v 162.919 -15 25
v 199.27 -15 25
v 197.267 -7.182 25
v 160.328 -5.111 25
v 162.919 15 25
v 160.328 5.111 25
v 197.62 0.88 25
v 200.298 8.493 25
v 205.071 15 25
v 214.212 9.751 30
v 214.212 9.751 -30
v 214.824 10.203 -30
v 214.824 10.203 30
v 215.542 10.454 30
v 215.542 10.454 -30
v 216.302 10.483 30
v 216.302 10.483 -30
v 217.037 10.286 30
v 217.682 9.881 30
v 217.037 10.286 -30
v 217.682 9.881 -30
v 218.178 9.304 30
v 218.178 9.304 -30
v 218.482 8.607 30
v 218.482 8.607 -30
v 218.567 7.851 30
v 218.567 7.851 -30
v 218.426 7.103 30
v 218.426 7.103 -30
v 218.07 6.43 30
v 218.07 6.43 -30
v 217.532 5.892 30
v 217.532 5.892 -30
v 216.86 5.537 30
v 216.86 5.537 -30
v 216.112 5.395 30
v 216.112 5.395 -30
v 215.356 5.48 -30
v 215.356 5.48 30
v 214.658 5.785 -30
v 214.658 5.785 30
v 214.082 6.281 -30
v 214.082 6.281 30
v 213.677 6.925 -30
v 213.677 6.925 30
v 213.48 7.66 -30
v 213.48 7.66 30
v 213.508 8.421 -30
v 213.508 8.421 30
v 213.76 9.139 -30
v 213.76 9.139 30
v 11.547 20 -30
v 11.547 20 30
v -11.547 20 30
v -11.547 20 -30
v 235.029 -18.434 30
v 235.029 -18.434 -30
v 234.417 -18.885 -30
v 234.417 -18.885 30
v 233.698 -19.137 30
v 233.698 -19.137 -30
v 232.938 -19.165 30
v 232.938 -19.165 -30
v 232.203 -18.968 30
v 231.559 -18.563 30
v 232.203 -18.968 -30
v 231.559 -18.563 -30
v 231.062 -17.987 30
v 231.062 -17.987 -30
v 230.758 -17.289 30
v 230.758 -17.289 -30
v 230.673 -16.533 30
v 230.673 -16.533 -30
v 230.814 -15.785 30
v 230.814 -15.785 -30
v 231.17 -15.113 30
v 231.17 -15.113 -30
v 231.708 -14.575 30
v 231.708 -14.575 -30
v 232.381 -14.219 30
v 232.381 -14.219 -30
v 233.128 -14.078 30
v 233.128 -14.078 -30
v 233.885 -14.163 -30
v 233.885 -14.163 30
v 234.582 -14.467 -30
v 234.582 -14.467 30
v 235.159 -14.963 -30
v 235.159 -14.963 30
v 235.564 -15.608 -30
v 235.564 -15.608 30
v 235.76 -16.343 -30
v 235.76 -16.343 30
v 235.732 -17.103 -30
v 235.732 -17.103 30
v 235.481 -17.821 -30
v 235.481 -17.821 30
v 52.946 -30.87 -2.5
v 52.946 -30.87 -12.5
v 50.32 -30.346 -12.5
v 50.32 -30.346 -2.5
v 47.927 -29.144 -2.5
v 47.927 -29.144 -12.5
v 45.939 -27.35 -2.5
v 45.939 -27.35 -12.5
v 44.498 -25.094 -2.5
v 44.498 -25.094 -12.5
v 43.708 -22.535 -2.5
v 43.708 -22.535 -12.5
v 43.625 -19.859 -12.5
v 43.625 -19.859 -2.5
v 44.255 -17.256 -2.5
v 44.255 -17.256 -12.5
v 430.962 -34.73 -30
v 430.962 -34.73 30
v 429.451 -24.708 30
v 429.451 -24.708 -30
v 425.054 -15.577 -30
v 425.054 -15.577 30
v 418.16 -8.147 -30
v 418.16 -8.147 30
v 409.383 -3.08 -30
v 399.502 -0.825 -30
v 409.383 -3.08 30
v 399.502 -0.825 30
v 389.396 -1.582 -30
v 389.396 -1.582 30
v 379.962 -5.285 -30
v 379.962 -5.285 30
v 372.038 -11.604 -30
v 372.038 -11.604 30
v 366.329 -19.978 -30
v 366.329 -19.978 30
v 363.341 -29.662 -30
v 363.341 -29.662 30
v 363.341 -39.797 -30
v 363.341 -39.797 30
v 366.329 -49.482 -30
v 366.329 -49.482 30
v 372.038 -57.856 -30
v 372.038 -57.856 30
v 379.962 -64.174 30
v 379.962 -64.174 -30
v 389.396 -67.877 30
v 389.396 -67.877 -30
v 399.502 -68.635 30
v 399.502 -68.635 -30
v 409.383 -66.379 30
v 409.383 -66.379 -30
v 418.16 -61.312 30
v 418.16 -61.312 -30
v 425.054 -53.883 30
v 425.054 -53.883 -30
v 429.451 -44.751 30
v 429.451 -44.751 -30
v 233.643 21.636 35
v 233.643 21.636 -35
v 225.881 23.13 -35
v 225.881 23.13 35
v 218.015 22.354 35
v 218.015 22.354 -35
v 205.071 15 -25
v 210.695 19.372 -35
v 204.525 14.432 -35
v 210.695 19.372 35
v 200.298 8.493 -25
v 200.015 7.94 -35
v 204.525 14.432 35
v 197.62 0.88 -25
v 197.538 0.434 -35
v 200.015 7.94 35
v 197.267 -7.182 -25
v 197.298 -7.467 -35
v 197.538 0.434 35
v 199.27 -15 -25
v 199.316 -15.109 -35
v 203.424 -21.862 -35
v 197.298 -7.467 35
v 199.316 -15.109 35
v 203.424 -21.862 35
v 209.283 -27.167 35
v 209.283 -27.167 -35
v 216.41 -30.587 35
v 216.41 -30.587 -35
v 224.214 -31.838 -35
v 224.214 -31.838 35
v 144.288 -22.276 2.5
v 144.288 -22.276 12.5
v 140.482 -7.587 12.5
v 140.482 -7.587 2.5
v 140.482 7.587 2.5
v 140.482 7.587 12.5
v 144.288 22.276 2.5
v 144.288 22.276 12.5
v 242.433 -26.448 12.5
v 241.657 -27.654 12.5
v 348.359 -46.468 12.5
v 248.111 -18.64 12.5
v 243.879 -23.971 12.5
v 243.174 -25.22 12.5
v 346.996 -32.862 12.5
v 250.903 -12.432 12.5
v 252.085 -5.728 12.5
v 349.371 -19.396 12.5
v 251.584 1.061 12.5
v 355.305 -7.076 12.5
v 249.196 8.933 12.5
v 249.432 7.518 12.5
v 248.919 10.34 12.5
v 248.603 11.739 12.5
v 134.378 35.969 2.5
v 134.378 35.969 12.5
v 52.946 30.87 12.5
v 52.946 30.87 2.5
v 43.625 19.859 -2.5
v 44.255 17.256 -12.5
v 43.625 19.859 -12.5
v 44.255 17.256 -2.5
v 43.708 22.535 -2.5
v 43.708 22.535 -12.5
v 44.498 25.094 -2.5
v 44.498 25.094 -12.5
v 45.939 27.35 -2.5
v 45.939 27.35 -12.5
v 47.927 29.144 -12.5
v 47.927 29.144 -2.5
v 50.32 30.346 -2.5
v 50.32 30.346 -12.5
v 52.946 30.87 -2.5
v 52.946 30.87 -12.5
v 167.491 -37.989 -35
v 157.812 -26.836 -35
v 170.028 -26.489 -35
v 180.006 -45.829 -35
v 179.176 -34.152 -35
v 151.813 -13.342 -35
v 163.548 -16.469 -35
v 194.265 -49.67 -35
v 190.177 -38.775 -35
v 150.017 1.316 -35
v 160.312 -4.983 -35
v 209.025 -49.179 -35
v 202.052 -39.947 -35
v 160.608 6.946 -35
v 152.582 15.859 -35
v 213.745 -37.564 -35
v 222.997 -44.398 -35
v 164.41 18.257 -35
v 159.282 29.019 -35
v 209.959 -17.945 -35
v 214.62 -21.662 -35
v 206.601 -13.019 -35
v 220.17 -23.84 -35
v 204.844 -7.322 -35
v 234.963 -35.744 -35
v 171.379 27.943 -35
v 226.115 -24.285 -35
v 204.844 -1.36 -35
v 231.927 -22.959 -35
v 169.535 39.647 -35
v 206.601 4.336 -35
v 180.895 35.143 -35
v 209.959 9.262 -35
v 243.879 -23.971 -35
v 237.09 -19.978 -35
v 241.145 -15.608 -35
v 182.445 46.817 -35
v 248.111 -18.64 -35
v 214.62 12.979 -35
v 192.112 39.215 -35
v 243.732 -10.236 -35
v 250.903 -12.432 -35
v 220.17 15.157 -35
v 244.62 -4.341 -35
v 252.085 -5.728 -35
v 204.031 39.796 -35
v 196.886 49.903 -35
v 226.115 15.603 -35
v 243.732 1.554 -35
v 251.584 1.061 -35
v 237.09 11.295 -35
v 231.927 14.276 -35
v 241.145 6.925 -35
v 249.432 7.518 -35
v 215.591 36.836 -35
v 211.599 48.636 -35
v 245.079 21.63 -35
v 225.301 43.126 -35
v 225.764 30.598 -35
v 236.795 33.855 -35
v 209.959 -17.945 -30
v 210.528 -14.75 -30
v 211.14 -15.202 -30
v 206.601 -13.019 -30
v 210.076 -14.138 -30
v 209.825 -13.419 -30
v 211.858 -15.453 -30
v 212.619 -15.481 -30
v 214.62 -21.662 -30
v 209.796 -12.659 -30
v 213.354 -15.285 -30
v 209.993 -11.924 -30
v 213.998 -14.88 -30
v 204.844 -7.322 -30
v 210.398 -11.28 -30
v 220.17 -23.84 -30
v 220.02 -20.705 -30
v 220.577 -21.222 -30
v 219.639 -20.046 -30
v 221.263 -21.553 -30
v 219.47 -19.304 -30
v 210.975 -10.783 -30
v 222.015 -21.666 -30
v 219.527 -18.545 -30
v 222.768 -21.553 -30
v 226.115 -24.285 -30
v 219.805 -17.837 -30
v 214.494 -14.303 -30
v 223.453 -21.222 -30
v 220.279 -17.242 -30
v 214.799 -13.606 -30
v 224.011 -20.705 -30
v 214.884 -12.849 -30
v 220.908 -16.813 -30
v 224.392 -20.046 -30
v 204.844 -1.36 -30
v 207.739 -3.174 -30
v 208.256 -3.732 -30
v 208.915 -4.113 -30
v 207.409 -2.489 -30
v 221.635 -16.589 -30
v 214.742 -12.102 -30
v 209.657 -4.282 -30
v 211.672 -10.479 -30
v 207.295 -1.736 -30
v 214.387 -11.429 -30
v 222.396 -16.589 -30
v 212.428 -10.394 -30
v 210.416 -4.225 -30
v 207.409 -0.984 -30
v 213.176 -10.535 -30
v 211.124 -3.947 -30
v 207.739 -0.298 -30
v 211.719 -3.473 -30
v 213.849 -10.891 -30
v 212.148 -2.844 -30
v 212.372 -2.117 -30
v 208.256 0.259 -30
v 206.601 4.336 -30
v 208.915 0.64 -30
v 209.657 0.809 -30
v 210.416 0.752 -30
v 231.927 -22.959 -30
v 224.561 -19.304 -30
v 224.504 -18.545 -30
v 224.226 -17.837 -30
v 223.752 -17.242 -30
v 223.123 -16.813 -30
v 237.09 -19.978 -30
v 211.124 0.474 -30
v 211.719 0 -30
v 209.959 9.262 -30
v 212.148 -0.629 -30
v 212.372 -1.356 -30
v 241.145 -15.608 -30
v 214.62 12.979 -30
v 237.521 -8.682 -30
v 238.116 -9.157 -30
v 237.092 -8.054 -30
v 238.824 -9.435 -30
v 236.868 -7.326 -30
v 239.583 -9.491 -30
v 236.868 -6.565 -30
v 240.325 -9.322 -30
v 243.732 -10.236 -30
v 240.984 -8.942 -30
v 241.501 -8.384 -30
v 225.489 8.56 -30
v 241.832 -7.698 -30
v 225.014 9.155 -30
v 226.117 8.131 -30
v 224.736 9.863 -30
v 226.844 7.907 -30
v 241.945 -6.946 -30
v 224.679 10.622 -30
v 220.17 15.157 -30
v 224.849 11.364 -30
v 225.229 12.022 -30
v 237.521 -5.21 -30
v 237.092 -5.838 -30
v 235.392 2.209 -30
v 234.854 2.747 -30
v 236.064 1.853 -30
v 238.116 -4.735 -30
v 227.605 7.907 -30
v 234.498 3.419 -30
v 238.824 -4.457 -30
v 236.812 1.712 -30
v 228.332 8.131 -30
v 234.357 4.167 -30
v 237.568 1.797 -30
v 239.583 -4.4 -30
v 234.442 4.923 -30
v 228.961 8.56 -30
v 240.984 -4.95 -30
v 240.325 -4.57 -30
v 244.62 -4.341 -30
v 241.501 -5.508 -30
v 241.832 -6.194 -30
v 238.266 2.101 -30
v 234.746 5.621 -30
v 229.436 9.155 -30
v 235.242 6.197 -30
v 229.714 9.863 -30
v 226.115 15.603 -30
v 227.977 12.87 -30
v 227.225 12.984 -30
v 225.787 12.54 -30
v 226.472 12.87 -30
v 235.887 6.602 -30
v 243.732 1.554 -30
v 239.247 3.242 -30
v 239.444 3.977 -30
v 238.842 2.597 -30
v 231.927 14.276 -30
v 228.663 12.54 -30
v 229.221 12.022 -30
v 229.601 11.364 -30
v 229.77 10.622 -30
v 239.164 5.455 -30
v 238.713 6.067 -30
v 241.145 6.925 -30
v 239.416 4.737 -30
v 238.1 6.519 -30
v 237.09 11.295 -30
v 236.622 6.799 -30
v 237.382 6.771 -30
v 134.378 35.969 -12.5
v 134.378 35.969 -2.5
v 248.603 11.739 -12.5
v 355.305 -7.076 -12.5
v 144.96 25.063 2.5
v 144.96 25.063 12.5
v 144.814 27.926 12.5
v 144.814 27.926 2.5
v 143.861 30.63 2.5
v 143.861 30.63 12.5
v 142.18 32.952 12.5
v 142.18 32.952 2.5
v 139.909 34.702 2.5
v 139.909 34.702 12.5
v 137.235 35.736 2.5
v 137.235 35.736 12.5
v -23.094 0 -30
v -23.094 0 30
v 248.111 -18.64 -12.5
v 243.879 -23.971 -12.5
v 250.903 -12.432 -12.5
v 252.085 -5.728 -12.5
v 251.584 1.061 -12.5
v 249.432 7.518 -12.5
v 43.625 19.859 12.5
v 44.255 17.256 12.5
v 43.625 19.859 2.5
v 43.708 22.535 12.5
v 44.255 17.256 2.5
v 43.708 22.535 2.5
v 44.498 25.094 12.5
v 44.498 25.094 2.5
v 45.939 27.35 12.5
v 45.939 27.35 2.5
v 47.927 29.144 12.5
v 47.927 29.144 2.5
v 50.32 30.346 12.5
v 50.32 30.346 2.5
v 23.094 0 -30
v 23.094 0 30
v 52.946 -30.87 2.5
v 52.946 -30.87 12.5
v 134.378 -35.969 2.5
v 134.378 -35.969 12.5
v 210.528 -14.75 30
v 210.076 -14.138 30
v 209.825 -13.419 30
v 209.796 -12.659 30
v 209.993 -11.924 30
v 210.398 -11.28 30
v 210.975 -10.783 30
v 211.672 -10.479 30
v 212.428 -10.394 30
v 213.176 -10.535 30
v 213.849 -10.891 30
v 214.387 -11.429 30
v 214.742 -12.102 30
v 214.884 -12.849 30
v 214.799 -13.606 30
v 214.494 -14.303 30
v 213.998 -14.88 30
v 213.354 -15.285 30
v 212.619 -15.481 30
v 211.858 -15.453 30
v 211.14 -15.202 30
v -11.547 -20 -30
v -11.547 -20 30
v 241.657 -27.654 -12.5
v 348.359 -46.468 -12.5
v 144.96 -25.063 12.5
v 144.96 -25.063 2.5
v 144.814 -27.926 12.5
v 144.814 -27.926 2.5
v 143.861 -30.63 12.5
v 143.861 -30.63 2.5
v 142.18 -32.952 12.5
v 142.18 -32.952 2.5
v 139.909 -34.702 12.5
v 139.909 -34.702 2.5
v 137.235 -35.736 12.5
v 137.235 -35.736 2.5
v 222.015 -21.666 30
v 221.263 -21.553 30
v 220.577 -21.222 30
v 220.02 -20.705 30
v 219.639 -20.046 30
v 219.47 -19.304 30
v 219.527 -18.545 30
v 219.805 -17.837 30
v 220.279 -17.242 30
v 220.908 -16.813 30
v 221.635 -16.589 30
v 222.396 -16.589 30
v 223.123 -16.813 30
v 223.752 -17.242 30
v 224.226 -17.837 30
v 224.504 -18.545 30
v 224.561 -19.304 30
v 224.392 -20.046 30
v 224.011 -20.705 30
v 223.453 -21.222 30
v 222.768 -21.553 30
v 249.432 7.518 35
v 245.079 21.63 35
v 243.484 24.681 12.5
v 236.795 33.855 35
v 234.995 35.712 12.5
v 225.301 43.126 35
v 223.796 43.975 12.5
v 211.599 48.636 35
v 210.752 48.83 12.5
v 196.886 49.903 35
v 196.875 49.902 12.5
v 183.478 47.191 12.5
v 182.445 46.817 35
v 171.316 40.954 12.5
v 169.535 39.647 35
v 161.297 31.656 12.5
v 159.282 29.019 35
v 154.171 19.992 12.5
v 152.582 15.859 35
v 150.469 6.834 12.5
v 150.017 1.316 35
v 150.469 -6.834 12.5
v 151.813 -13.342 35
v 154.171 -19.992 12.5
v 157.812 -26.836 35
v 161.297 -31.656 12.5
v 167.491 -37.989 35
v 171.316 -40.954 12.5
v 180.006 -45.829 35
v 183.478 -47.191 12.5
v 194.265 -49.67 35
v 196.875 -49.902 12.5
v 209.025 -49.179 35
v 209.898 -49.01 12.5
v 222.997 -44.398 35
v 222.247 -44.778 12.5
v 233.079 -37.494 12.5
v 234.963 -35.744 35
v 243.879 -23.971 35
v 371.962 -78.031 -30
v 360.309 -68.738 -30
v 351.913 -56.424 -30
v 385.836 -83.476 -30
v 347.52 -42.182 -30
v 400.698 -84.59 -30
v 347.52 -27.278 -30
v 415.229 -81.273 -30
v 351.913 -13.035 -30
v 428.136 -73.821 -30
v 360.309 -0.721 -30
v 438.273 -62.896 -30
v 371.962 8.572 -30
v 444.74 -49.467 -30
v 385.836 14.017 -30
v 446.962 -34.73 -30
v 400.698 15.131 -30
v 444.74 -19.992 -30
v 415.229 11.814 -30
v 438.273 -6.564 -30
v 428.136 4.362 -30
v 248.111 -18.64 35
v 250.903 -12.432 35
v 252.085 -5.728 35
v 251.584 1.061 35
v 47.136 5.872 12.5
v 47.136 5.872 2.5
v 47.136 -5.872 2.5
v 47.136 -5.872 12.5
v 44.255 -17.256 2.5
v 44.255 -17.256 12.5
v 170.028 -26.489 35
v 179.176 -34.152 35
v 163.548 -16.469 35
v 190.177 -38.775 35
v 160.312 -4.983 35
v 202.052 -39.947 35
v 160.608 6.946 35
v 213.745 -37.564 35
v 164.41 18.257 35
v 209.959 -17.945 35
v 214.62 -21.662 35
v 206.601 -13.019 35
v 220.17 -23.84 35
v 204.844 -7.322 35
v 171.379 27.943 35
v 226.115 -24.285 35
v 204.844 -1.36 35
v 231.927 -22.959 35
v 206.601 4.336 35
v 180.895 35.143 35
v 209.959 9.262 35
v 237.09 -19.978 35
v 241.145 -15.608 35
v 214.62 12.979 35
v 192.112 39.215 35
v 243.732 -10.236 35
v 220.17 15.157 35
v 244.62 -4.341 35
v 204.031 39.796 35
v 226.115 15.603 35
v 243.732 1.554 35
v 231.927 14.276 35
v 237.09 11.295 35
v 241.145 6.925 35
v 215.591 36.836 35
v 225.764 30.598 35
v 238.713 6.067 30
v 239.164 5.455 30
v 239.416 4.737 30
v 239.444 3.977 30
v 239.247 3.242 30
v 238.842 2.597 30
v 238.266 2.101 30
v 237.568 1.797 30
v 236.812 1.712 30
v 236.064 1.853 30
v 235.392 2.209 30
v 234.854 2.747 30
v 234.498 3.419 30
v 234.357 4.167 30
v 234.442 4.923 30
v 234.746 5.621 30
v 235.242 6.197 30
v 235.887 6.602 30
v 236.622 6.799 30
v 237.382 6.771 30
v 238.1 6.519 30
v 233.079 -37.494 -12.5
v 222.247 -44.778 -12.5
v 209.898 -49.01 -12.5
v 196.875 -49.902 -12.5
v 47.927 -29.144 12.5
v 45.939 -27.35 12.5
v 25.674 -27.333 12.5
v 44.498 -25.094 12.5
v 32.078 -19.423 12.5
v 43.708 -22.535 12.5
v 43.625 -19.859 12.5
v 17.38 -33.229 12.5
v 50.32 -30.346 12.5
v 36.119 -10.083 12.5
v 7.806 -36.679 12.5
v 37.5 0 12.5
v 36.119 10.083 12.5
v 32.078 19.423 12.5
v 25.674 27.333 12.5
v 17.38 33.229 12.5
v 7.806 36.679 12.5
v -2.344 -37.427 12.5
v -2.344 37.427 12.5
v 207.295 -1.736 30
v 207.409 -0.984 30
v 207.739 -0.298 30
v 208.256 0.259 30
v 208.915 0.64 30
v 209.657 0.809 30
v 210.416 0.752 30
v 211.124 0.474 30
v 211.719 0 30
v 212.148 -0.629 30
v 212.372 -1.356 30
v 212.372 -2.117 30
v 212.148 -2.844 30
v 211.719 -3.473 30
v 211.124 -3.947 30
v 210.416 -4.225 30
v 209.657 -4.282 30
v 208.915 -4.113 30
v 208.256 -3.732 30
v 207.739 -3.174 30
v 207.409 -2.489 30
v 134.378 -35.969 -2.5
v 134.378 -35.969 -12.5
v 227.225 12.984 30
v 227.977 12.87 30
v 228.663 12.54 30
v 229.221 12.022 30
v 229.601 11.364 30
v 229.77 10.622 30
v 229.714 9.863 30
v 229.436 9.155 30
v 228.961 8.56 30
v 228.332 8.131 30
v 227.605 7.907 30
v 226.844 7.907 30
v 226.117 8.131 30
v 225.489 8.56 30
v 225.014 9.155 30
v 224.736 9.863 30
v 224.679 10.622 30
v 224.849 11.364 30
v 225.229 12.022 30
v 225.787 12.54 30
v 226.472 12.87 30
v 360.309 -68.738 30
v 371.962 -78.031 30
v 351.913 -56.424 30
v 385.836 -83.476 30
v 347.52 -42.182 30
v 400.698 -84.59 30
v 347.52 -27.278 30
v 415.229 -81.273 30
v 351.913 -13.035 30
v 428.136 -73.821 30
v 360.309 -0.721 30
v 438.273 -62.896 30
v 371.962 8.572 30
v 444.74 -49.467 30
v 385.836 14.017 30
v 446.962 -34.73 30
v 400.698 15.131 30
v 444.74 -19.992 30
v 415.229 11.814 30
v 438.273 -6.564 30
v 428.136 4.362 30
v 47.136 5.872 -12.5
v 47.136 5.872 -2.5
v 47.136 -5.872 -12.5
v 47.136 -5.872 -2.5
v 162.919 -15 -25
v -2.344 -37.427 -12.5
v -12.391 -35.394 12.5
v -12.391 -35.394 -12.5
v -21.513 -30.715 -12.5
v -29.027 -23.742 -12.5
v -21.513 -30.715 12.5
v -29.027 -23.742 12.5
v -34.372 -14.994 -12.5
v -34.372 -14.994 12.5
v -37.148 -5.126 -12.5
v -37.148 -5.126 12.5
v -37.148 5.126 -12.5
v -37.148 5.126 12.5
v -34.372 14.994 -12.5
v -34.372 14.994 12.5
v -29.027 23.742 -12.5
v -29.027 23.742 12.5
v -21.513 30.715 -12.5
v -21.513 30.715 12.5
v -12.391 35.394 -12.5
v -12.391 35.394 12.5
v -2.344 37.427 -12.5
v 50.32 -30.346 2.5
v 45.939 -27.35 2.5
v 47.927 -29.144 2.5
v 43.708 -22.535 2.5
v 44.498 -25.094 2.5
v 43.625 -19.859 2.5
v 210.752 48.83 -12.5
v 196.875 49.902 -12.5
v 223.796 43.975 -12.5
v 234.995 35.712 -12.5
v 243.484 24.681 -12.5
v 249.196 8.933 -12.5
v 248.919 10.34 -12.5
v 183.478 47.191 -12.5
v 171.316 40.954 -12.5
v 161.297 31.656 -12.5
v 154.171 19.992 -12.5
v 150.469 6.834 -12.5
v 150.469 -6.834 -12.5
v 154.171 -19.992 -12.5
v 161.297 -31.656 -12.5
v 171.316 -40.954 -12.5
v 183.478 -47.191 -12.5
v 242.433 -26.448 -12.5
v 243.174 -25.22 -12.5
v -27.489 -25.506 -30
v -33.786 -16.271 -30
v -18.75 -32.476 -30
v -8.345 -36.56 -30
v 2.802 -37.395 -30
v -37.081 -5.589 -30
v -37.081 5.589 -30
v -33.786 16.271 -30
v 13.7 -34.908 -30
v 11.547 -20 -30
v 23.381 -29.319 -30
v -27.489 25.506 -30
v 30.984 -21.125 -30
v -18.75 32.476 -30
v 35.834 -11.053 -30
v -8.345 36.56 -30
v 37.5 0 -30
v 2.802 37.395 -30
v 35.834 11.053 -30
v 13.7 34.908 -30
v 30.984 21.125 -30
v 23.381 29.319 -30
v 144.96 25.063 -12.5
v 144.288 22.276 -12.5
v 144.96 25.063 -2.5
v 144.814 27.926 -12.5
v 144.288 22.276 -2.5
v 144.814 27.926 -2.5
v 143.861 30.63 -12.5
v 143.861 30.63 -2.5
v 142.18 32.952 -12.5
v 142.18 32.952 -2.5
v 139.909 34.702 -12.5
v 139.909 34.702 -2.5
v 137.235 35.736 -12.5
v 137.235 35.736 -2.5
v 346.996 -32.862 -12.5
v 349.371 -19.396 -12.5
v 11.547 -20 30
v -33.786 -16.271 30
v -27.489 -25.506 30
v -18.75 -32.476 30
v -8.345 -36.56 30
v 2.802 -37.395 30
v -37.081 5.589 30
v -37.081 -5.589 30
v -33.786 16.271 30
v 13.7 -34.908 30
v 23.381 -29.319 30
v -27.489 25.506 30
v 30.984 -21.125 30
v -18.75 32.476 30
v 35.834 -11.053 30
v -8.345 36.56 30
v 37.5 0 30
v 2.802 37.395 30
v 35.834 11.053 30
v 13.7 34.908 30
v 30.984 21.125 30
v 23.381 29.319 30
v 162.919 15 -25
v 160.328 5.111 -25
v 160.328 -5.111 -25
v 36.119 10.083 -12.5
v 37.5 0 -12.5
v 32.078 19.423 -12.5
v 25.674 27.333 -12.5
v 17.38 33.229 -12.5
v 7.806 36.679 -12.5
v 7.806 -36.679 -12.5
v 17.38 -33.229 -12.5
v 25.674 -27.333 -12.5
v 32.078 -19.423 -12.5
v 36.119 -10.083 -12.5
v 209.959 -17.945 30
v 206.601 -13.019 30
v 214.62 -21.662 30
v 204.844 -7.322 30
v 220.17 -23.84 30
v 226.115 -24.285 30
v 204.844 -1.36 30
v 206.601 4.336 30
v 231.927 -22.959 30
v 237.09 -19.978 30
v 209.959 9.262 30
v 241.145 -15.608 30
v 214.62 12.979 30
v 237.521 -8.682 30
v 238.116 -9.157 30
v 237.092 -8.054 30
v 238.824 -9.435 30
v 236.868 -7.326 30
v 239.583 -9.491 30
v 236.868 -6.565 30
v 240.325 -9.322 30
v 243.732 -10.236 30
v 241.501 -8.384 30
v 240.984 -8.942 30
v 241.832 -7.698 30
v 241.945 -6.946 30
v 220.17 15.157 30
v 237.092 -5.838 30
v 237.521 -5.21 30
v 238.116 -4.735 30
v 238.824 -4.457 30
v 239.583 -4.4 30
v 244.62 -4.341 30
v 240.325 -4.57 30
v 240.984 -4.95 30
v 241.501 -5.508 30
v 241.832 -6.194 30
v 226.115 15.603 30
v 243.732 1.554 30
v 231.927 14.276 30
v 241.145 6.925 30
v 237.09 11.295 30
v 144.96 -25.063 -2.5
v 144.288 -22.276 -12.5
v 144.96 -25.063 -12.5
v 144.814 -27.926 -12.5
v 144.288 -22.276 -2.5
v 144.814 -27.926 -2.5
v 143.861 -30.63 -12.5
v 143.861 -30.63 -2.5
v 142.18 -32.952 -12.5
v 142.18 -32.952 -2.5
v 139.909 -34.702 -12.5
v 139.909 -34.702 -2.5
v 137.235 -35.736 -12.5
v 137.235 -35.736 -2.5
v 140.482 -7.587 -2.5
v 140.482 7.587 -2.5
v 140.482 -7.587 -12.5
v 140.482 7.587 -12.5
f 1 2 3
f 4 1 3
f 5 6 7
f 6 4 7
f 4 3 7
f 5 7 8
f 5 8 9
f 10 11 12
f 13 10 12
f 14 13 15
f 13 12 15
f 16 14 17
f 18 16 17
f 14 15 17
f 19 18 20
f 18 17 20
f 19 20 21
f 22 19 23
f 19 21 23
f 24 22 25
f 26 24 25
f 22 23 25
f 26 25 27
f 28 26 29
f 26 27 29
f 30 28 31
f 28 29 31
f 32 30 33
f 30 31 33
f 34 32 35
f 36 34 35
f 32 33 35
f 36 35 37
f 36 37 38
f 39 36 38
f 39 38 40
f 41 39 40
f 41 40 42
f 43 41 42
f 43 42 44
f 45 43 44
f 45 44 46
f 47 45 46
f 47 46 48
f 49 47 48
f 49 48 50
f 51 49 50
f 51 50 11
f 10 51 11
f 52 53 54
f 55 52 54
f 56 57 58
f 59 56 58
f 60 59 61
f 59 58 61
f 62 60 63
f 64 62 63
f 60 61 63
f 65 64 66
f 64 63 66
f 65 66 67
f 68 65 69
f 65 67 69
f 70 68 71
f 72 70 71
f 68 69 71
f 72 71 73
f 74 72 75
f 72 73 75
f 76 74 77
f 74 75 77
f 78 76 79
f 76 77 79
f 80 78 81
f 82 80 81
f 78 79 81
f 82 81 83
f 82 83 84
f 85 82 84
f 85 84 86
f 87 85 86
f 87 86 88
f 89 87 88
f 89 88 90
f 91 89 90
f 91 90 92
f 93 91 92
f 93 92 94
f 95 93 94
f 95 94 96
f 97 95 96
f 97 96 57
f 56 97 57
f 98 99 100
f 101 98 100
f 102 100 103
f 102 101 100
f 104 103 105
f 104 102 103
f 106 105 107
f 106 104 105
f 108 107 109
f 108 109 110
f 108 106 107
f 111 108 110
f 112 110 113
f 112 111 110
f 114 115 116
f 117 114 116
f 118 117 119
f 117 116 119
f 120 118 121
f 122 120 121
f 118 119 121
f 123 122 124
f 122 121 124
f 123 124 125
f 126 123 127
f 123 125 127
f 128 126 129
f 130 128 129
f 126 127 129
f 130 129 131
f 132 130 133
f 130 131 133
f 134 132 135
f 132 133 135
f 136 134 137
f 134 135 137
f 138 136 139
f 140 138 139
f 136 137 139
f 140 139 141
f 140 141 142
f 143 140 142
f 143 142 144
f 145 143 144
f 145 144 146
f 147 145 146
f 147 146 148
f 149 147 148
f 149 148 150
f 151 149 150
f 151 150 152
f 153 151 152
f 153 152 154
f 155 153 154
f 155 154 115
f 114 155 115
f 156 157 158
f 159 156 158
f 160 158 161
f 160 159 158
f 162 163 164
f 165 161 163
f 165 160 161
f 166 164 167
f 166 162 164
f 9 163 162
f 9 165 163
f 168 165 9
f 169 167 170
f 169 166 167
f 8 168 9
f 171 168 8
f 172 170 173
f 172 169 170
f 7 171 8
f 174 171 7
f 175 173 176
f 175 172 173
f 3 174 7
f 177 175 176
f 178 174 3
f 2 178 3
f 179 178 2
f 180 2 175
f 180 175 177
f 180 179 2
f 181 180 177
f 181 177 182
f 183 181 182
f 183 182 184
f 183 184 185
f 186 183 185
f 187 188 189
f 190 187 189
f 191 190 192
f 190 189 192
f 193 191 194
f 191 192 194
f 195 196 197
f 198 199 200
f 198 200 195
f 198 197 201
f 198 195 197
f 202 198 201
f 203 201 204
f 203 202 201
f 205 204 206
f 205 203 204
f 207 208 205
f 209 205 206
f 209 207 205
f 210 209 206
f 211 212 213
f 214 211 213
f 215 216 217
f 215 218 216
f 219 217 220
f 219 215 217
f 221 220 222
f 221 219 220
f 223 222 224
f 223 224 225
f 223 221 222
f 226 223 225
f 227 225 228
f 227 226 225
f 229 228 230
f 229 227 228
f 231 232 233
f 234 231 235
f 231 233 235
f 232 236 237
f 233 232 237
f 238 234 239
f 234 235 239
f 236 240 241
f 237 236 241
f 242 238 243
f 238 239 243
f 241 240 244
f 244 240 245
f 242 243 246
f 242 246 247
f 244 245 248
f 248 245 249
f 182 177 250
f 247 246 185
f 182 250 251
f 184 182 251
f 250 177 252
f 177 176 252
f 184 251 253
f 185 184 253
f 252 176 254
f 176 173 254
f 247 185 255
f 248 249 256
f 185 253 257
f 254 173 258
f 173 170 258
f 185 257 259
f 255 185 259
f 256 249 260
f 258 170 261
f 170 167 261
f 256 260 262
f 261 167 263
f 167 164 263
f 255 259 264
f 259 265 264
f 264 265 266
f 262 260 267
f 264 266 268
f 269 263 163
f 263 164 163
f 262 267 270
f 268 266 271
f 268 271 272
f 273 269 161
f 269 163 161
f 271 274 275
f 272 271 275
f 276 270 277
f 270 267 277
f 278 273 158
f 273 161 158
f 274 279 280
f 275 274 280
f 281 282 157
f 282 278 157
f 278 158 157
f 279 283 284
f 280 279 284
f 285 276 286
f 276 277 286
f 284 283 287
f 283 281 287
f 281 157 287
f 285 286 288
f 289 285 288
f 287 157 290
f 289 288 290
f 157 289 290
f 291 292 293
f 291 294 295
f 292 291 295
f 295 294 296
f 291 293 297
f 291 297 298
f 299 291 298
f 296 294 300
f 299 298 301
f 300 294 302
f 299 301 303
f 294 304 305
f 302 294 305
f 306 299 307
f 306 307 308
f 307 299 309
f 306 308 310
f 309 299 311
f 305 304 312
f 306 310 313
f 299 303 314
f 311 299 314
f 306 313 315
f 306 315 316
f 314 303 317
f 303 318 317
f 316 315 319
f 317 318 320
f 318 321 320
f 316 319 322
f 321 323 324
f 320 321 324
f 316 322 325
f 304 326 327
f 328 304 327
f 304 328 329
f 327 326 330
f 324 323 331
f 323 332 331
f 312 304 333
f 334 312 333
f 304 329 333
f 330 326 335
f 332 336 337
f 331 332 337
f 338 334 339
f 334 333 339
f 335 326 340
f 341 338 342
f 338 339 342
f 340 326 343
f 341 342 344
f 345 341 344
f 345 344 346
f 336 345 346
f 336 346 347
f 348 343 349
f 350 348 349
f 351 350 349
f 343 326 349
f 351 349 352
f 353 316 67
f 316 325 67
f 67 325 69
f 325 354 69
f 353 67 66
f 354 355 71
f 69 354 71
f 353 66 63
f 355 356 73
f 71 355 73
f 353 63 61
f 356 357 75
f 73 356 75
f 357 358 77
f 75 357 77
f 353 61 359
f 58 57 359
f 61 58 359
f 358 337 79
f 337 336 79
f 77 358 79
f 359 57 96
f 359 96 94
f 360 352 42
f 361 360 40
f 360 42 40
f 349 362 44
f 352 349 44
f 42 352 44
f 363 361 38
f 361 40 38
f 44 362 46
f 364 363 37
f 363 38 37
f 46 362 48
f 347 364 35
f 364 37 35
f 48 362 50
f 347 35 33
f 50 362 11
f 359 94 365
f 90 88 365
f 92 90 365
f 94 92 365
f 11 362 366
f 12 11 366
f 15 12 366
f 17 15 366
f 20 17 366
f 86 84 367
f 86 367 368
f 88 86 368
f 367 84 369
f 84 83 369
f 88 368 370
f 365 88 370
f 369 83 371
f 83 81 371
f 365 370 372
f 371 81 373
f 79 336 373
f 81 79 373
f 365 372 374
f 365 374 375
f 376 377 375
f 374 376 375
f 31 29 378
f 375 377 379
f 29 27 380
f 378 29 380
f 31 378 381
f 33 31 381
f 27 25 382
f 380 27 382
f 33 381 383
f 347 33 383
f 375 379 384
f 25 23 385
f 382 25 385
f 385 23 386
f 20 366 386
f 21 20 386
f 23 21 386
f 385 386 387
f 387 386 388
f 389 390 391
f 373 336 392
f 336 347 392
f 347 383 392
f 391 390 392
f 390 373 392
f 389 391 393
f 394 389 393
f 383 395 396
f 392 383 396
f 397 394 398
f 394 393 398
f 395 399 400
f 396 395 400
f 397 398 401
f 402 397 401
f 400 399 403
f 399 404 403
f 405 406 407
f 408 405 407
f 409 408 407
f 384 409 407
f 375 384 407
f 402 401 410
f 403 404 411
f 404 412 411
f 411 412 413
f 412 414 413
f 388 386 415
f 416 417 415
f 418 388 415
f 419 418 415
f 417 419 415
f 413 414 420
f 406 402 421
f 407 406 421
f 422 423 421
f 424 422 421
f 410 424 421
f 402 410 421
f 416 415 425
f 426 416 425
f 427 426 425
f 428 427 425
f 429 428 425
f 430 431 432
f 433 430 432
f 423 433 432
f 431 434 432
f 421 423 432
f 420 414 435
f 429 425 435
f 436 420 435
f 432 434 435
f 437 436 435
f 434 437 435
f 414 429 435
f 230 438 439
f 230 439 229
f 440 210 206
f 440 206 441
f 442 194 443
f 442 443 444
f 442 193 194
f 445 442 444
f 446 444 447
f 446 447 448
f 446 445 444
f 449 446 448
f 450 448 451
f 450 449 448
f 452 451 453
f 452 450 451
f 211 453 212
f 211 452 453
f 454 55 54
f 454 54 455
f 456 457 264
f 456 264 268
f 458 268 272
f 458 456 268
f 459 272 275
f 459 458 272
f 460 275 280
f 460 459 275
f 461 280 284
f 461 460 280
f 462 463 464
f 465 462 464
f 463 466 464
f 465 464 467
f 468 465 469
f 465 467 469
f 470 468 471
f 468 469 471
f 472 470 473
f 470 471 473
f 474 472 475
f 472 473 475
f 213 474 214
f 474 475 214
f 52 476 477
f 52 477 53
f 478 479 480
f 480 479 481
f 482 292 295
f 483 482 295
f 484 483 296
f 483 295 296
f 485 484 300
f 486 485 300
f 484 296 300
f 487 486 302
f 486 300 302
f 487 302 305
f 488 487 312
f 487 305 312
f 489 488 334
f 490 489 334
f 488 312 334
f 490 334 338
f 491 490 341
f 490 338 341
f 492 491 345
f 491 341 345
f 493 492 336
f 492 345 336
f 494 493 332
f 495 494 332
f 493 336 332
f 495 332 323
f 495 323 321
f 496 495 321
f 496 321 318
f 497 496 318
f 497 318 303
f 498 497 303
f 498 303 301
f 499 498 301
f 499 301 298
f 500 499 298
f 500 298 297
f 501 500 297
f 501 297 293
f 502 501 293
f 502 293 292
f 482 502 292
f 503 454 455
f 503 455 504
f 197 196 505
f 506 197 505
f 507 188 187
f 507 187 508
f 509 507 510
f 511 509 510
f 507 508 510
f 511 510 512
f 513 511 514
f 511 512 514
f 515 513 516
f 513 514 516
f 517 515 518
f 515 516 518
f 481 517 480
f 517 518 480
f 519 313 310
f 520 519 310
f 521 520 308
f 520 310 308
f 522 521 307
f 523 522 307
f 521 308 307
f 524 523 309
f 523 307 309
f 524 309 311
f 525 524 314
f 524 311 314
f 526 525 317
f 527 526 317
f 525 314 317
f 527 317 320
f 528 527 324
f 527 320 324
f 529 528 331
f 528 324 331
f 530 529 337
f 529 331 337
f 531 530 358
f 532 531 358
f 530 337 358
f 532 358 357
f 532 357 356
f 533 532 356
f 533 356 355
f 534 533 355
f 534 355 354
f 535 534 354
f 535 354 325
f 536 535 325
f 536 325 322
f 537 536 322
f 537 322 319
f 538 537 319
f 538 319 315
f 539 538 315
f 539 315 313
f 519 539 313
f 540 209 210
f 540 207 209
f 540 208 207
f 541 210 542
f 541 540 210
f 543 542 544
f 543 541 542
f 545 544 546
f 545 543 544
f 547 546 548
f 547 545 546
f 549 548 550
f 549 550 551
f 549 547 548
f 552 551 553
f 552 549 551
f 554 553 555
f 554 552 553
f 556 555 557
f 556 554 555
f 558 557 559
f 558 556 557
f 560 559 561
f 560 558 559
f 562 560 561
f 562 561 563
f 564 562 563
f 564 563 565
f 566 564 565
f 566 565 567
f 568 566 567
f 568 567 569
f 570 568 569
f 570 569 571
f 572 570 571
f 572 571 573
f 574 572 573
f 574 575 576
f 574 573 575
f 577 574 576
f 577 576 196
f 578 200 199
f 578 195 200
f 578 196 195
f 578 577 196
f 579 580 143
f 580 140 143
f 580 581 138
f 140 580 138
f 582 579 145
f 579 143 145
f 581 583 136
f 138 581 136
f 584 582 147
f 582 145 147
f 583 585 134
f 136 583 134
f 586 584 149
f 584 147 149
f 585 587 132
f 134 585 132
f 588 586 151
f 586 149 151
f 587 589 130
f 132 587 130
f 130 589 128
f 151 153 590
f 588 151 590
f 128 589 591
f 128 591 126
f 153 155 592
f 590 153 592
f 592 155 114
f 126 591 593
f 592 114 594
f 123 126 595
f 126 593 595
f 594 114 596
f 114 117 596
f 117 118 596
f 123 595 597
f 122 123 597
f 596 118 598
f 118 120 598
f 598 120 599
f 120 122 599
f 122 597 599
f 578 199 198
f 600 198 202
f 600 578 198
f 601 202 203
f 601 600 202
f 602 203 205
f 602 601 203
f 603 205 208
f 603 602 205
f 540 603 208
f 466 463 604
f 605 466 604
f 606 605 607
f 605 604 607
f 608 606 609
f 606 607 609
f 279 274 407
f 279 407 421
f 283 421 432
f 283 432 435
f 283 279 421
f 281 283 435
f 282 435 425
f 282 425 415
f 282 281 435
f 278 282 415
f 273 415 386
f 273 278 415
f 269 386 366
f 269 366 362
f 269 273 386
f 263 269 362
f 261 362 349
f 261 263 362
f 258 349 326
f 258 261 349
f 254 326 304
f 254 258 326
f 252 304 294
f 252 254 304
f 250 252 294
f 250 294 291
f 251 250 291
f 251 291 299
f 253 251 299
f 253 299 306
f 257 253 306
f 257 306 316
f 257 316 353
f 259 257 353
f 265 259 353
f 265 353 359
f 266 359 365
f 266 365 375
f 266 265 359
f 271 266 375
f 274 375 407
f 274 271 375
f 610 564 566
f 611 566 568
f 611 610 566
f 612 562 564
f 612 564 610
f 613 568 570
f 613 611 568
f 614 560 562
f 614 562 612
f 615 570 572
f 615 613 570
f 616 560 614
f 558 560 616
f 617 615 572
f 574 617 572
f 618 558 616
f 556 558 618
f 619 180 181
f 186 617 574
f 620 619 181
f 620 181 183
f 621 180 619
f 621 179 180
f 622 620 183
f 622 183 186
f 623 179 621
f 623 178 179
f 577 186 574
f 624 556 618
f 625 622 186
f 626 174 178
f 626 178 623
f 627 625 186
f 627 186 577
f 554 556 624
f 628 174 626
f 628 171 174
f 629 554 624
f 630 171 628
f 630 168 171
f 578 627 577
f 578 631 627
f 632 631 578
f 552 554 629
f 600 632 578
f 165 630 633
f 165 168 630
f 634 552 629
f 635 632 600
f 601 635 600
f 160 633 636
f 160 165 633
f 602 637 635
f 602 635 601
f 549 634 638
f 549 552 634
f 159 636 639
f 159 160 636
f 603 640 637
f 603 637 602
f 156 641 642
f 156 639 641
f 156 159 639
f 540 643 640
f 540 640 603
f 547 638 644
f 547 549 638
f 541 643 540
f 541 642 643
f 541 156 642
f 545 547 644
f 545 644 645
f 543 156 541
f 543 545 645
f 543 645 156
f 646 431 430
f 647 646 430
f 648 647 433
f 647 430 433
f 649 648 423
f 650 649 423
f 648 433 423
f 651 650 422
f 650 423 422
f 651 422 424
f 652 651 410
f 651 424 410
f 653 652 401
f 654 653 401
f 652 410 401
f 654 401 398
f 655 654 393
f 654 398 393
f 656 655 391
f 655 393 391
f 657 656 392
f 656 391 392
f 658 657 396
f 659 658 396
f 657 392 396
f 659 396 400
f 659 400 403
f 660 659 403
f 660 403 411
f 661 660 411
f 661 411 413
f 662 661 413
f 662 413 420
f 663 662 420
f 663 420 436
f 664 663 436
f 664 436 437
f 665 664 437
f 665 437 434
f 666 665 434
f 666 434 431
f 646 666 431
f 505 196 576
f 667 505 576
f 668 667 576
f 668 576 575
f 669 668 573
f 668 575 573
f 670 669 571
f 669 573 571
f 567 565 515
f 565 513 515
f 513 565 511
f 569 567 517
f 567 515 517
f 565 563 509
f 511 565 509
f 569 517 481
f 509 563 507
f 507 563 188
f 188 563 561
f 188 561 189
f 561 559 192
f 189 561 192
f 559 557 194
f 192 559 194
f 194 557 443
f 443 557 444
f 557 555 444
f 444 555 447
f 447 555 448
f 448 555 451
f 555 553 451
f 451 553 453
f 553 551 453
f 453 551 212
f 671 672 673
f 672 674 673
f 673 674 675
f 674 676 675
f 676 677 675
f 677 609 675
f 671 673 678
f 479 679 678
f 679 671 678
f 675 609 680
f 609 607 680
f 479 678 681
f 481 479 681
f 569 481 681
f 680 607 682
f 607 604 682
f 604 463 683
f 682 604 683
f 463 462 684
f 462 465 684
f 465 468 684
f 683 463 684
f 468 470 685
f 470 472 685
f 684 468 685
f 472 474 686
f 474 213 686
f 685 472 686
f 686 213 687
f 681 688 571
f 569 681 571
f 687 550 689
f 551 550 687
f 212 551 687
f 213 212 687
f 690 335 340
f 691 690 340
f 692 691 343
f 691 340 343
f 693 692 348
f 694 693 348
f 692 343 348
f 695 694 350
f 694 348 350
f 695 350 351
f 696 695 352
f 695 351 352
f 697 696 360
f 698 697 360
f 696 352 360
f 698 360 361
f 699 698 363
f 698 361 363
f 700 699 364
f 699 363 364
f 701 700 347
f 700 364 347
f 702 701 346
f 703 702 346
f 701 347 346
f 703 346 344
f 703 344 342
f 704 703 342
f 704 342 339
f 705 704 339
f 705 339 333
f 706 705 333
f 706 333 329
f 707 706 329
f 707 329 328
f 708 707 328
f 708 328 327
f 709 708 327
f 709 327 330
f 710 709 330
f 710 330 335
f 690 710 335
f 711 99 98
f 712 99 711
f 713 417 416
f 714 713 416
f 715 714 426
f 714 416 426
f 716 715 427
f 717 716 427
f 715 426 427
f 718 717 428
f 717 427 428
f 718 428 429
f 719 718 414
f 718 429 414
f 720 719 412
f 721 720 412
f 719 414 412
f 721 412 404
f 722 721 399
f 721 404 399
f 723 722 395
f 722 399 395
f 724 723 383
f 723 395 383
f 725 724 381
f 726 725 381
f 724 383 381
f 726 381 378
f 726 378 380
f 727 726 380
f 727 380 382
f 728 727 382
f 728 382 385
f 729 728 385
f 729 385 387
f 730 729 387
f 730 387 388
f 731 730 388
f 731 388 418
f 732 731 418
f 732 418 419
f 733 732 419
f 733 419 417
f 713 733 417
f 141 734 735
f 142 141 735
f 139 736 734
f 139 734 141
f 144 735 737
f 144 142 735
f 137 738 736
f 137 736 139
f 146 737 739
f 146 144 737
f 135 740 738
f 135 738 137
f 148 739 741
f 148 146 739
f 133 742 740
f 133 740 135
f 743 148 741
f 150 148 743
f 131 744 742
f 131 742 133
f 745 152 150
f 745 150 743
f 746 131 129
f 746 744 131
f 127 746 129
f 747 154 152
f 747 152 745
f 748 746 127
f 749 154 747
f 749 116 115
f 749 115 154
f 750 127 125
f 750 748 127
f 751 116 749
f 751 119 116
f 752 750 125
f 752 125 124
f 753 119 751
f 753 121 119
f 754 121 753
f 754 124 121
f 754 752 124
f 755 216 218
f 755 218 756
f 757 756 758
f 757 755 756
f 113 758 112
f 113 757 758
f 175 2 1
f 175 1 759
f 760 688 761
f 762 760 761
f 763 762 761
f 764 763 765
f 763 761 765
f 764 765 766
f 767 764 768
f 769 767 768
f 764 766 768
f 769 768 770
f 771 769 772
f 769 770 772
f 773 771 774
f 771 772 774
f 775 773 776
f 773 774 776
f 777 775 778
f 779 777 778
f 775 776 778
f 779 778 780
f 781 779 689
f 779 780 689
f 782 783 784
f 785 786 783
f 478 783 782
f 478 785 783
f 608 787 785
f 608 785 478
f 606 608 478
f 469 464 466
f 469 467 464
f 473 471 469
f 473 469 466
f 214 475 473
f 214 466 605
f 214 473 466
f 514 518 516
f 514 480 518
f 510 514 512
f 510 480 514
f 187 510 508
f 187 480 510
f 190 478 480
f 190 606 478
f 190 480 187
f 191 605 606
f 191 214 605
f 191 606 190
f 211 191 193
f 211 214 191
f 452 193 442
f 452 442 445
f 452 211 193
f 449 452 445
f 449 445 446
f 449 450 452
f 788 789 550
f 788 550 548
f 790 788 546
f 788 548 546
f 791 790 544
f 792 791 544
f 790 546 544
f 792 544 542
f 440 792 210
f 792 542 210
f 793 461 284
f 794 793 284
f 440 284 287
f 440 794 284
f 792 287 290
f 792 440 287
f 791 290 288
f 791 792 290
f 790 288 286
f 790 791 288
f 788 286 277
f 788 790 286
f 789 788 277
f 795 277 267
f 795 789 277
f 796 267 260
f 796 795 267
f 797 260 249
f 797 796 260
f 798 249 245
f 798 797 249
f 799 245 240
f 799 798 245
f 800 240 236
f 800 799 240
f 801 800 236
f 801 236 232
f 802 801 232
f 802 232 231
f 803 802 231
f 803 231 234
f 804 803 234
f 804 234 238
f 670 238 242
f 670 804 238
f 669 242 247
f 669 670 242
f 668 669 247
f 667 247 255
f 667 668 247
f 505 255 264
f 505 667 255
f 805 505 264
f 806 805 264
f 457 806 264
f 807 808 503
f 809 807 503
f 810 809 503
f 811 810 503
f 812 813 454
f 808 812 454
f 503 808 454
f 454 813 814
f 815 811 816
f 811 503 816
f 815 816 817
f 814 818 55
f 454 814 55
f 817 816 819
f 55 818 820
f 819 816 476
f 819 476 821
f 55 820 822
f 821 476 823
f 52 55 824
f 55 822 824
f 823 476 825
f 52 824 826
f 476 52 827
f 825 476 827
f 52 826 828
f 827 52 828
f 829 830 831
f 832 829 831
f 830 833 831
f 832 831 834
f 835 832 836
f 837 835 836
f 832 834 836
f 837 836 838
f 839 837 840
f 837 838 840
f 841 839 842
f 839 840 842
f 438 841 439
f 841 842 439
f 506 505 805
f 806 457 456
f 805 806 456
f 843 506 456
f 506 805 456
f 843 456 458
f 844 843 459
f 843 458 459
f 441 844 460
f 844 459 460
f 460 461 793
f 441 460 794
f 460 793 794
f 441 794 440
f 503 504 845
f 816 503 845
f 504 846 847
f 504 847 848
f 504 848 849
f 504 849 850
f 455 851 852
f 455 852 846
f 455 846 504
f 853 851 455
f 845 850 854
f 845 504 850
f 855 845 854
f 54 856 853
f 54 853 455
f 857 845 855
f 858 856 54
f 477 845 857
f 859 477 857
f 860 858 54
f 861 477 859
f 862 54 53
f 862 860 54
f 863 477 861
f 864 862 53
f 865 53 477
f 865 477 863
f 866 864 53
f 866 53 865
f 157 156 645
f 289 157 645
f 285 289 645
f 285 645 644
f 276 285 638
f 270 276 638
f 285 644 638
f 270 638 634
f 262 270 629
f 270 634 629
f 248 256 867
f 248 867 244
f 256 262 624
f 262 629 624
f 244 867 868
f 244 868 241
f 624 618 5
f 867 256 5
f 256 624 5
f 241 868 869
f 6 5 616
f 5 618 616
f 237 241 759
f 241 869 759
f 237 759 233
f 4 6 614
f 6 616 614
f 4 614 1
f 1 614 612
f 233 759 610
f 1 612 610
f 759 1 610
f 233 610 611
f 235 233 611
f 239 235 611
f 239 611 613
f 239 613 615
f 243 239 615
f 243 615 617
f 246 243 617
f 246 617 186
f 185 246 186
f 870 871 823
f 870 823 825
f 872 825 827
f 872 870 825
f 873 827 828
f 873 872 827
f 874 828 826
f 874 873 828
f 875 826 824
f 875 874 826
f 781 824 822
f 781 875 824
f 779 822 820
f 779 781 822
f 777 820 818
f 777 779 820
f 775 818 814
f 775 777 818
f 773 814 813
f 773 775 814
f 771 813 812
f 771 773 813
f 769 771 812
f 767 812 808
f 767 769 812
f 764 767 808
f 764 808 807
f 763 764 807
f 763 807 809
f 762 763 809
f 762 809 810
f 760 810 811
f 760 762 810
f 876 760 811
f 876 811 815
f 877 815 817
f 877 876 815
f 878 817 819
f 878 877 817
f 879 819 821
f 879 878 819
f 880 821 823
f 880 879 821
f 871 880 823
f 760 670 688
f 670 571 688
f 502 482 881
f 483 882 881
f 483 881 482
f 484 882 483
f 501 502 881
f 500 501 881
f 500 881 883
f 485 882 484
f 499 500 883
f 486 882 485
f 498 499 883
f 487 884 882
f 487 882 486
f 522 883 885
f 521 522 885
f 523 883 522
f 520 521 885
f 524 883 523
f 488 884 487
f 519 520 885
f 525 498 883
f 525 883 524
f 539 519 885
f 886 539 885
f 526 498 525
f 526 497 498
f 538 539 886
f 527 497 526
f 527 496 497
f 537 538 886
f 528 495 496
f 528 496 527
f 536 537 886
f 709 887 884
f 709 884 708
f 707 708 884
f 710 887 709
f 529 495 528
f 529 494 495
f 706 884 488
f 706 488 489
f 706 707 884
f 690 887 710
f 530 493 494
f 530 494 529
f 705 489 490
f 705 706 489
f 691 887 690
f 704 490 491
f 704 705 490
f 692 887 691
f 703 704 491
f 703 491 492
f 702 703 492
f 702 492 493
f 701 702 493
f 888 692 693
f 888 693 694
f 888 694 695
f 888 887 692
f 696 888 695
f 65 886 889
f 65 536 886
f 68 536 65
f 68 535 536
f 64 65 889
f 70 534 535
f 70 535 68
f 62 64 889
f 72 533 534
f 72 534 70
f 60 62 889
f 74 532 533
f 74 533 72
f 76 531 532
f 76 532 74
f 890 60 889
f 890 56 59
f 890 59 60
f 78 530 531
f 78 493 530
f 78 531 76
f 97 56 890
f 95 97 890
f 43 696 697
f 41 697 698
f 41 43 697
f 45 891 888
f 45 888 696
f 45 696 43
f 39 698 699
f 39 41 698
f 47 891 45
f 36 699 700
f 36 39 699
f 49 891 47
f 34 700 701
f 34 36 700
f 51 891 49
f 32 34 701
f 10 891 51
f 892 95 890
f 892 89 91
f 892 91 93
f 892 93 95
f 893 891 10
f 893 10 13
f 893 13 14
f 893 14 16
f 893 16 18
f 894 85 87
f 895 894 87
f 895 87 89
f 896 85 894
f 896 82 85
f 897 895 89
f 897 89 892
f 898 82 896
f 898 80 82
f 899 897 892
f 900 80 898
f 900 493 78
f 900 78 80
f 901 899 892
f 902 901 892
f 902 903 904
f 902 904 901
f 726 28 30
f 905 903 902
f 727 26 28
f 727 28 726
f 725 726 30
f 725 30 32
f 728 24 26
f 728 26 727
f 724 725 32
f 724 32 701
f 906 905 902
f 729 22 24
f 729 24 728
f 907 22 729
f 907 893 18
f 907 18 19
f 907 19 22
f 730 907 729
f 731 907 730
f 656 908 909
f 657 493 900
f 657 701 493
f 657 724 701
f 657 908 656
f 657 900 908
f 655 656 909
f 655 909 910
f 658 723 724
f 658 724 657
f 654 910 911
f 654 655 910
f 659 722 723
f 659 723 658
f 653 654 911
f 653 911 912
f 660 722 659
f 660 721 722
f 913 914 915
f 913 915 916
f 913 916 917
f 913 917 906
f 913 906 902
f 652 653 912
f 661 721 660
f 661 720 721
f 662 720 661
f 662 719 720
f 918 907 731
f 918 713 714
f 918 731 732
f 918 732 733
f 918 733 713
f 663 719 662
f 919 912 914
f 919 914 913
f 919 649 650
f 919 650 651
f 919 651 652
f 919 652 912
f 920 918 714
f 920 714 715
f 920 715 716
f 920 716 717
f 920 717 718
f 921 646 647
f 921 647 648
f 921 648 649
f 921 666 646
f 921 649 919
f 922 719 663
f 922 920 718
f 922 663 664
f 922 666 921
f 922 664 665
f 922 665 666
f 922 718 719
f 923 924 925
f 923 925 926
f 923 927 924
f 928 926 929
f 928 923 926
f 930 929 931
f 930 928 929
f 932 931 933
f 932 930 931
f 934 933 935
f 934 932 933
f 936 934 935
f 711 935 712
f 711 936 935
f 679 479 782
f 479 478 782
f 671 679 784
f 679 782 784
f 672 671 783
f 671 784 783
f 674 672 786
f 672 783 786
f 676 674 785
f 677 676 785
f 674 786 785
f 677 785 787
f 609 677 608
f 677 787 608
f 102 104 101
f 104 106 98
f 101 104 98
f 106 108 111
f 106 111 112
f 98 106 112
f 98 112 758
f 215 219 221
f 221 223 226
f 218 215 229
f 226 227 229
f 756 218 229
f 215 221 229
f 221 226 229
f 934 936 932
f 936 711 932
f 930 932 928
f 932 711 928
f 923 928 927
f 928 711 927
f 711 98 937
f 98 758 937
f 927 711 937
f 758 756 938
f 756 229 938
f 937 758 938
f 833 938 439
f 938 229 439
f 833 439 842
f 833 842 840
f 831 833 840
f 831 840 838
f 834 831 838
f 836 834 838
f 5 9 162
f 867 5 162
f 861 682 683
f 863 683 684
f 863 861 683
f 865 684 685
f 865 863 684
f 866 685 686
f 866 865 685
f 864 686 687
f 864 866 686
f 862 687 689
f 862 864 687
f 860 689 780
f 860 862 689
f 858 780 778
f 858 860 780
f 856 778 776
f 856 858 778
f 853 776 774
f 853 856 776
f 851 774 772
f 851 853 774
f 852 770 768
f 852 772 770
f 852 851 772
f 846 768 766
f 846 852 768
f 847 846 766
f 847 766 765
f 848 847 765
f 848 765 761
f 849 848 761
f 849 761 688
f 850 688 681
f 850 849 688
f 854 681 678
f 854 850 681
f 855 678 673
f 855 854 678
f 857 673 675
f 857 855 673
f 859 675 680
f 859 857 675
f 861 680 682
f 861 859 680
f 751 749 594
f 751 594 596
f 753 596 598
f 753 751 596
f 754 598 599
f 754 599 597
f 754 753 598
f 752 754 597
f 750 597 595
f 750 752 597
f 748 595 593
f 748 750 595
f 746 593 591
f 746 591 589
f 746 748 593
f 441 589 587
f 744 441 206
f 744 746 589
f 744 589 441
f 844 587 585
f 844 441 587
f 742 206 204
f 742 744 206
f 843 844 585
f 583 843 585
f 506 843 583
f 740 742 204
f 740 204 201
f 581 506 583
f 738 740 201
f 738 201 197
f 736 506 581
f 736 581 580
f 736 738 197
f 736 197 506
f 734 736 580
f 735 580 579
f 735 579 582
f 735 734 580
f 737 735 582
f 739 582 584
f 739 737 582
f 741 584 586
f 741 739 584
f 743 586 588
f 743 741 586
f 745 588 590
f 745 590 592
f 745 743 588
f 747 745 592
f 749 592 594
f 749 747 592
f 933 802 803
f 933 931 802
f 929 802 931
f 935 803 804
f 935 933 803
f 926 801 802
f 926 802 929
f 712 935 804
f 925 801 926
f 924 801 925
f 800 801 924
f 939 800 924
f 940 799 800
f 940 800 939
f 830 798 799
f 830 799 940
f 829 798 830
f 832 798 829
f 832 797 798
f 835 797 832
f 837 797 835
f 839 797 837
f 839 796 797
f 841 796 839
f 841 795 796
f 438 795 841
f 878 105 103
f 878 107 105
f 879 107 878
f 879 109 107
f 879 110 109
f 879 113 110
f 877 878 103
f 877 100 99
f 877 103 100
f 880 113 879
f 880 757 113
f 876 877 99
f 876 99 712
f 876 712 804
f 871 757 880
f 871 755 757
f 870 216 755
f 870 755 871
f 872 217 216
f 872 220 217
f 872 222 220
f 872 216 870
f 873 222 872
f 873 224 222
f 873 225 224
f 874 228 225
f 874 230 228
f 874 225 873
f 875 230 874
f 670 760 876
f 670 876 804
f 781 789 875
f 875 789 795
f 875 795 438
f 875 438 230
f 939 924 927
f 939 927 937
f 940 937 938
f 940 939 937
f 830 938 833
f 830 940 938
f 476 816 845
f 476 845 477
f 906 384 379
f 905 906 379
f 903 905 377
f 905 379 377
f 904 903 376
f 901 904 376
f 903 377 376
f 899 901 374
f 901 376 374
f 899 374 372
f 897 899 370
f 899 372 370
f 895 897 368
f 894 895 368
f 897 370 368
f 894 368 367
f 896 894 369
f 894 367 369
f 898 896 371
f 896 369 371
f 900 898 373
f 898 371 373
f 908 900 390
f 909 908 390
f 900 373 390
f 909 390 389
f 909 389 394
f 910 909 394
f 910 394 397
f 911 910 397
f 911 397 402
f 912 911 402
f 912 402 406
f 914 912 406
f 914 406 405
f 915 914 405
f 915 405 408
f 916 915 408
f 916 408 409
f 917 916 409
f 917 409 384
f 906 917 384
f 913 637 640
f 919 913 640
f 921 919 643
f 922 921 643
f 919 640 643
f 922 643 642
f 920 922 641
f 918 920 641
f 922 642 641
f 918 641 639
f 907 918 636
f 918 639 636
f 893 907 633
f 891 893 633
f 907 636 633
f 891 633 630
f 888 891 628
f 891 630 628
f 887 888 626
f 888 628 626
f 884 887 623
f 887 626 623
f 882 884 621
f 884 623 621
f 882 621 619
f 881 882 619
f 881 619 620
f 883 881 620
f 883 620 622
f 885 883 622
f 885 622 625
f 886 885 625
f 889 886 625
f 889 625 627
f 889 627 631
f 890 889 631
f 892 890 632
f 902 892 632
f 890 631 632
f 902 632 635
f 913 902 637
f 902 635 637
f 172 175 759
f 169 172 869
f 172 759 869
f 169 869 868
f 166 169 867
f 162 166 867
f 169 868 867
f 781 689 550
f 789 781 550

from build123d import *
from build123d.topology import SkipClean

# Parameters (mm, degrees)
LEFT_ARM_DEPTH                = 12.5
SKETCH2_R                     = 37.5
LEFT_BOSS_DEPTH               = 30
LEFT_HEX_DEPTH                = 262.916017
LEFT_HEX_DEPTH_BACK           = 262.916017
SKETCH3_R                     = 50
CENTRE_BOSS_DEPTH             = 35
SKETCH5_W                     = 25
SKETCH5_H                     = 40
RIGHT_ARM_DEPTH               = 200
SKETCH7_R                     = 50
RIGHT_BOSS_DEPTH              = 30
SKETCH8_R                     = 34
RIGHT_BOSS_HOLE_DEPTH         = 460.541879
SKETCH9_R                     = 40
CENTRE_HOLE_DEPTH             = 461.27572
SKETCH10_R                    = 27.5
CENTRE_BLOB_DEPTH             = 35
CENTRE_BEAM_REACH             = 265.428
SKETCH11_W                    = 50
SKETCH11_H                    = 30
CENTRE_BEAM_DIRECTION_2_REACH = 265.428
SKETCH12_R                    = 20
CUT_EXTRUDE4_DEPTH            = 5
F_1_4_20_TAPPED_HOLE1_D       = 5.1054
CIRPATTERN1_COUNT             = 8
CUT_OUT_DEPTH                 = 10
FILLET1_R                     = 10
FILLET1_OF_MIRROR2_R          = 10


with BuildPart() as part:
    # Sketch1 → LEFT_ARM (new, symmetric)
    with BuildSketch(Plane.XY):
        with BuildLine():
            Line((-2.34375, 37.426686), (196.875, 49.902248))
            ThreePointArc((196.875, 49.902248), (250, 0), (196.875, -49.902248))
            Line((196.875, -49.902248), (-2.34375, -37.426686))
            ThreePointArc((-2.34375, -37.426686), (-37.5, 0), (-2.34375, 37.426686))
        make_face()
    extrude(amount=LEFT_ARM_DEPTH, both=True)

    # Sketch2 → LEFT_Boss (add, symmetric)
    with SkipClean():  # the faces are left unmerged after this step: merging them gives an invalid solid
        with BuildSketch(Plane.XY):
            Circle(SKETCH2_R)
        extrude(amount=LEFT_BOSS_DEPTH, both=True)

    # Sketch4 → LEFT_Hex (cut, two sides: drawn at the far end of the back side and taken through both)
    with SkipClean():  # the faces are left unmerged after this step: merging them gives an invalid solid
        with BuildSketch(Plane.XY.offset(30).offset(-LEFT_HEX_DEPTH_BACK)):
            Polygon((23.094011, 0), (11.547005, 20), (-11.547005, 20), (-23.094011, 0), (-11.547005, -20), (11.547005, -20), align=None)
        extrude(amount=LEFT_HEX_DEPTH + LEFT_HEX_DEPTH_BACK, mode=Mode.SUBTRACT)

    # Sketch3 → CENTRE_Boss (add, symmetric)
    with SkipClean():  # the faces are left unmerged after this step: merging them gives an invalid solid
        with BuildSketch(Plane.XY):
            with Locations((200, 0)):
                Circle(SKETCH3_R)
        extrude(amount=CENTRE_BOSS_DEPTH, both=True)

    # Sketch5 → RIGHT_ARM (add)
    with SkipClean():  # the faces are left unmerged after this step: merging them gives an invalid solid
        with BuildSketch(Plane(origin=(193.969262, -34.202014, 0), x_dir=(0, 0, -1), z_dir=(0.984807753012208, -0.17364817766693072, 0))):
            with Locations((0, 34.729636)):
                Rectangle(SKETCH5_W, SKETCH5_H)
        extrude(amount=RIGHT_ARM_DEPTH)

    # Sketch7 → RIGHT_Boss (add, symmetric)
    with SkipClean():  # the faces are left unmerged after this step: merging them gives an invalid solid
        with BuildSketch(Plane.XY):
            with Locations((396.961551, -34.729636)):
                Circle(SKETCH7_R)
        extrude(amount=RIGHT_BOSS_DEPTH, both=True)

    # Sketch8 → RIGHT_Boss_Hole (cut, through all)
    with SkipClean():  # the faces are left unmerged after this step: merging them gives an invalid solid
        with BuildSketch(Plane.XY.offset(30)):
            with Locations((396.961551, -34.729636)):
                Circle(SKETCH8_R)
        extrude(amount=-RIGHT_BOSS_HOLE_DEPTH, mode=Mode.SUBTRACT)

    # Sketch9 → CENTRE_Hole (cut, through all)
    with SkipClean():  # the faces are left unmerged after this step: merging them gives an invalid solid
        with BuildSketch(Plane.XY.offset(35)):
            with Locations((200, 0)):
                Circle(SKETCH9_R)
        extrude(amount=-CENTRE_HOLE_DEPTH, mode=Mode.SUBTRACT)

    # Sketch10 → CENTRE_Blob (add, symmetric)
    with SkipClean():  # the faces are left unmerged after this step: merging them gives an invalid solid
        with BuildSketch(Plane.XY):
            with Locations((224.620194, -4.341204)):
                Circle(SKETCH10_R)
        extrude(amount=CENTRE_BLOB_DEPTH, both=True)

    # Sketch11 → CENTRE_Beam (add, up to next)
    with BuildSketch(Plane(origin=(200, 0, 0), x_dir=(0, 0, -1), z_dir=(1, 0, 0)), mode=Mode.PRIVATE) as centre_beam_sk1:
        Rectangle(SKETCH11_W, SKETCH11_H)
    centre_beam_tool1 = extrude(centre_beam_sk1.sketch, amount=CENTRE_BEAM_REACH, mode=Mode.PRIVATE) - part.part
    add(centre_beam_tool1.solids().sort_by_distance((200, 0, 0))[0])

    # Sketch11 → CENTRE_Beam direction 2 (add, up to next)
    with BuildSketch(Plane(origin=(200, 0, 0), x_dir=(0, 0, -1), z_dir=(1, 0, 0)), mode=Mode.PRIVATE) as centre_beam_direction_2_sk1:
        Rectangle(SKETCH11_W, SKETCH11_H)
    centre_beam_direction_2_tool1 = extrude(centre_beam_direction_2_sk1.sketch, amount=-CENTRE_BEAM_DIRECTION_2_REACH, mode=Mode.PRIVATE) - part.part
    add(centre_beam_direction_2_tool1.solids().sort_by_distance((200, 0, 0))[0])

    # Sketch12 → Cut-Extrude4 (cut)
    with SkipClean():  # the faces are left unmerged after this step: merging them gives an invalid solid
        with BuildSketch(Plane.XY.offset(35)):
            with Locations((224.620194, -4.341204)):
                Circle(SKETCH12_R)
        cut_extrude4 = extrude(amount=-CUT_EXTRUDE4_DEPTH, mode=Mode.SUBTRACT)

    # 1/4-20 Tapped Hole1 (through all)
    with Locations(Plane.XY.offset(30)):
        with Locations((209.848078, -1.736482)):
            f_1_4_20_tapped_hole1 = Hole(F_1_4_20_TAPPED_HOLE1_D / 2)

    # CirPattern1: 1/4-20 Tapped Hole1 ×8 about axis
    with SkipClean():  # the faces are left unmerged after this step: merging them gives an invalid solid
        cirpattern1_axis = Axis((224.620194, -4.341204, 0), (0, 0, 1))
        for i in range(1, CIRPATTERN1_COUNT):
            add(f_1_4_20_tapped_hole1.rotate(cirpattern1_axis, i * 360 / CIRPATTERN1_COUNT), mode=Mode.SUBTRACT)

    # Mirror1: Cut-Extrude4 across plane
    with SkipClean():  # the faces are left unmerged after this step: merging them gives an invalid solid
        add(cut_extrude4.mirror(Plane.XY), mode=Mode.SUBTRACT)

    # Sketch15 → Cut_OUT (cut)
    with SkipClean():  # the faces are left unmerged after this step: merging them gives an invalid solid
        with BuildSketch(Plane.XY.offset(12.5)):
            with BuildLine():
                Line((152.866072, 37.126714), (36.935365, 29.866851))
                ThreePointArc((36.935365, 29.866851), (47.5, 0), (36.935365, -29.866851))
                Line((36.935365, -29.866851), (152.866072, -37.126714))
                ThreePointArc((152.866072, -37.126714), (140, 0), (152.866072, 37.126714))
            make_face()
        cut_out = extrude(amount=-CUT_OUT_DEPTH, mode=Mode.SUBTRACT)

    # Fillet1
    fillet1_edges = [part.edges().sort_by_distance(p)[0] for p in [
        (36.935365, -29.866851, 7.5),
        (36.935365, 29.866851, 7.5),
        (152.866072, 37.126714, 7.5),
        (152.866072, -37.126714, 7.5),
    ]]
    fillet(fillet1_edges, radius=FILLET1_R)

    # Mirror2: Cut_OUT across plane
    with SkipClean():  # the faces are left unmerged after this step: merging them gives an invalid solid
        add(cut_out.mirror(Plane.XY), mode=Mode.SUBTRACT)

    # Fillet1 of Mirror2
    fillet1_of_mirror2_edges = [part.edges().sort_by_distance(p)[0] for p in [
        (36.935365, -29.866851, -7.5),
        (36.935365, 29.866851, -7.5),
        (152.866072, 37.126714, -7.5),
        (152.866072, -37.126714, -7.5),
    ]]
    fillet(fillet1_of_mirror2_edges, radius=FILLET1_OF_MIRROR2_R)


solid = part.part
